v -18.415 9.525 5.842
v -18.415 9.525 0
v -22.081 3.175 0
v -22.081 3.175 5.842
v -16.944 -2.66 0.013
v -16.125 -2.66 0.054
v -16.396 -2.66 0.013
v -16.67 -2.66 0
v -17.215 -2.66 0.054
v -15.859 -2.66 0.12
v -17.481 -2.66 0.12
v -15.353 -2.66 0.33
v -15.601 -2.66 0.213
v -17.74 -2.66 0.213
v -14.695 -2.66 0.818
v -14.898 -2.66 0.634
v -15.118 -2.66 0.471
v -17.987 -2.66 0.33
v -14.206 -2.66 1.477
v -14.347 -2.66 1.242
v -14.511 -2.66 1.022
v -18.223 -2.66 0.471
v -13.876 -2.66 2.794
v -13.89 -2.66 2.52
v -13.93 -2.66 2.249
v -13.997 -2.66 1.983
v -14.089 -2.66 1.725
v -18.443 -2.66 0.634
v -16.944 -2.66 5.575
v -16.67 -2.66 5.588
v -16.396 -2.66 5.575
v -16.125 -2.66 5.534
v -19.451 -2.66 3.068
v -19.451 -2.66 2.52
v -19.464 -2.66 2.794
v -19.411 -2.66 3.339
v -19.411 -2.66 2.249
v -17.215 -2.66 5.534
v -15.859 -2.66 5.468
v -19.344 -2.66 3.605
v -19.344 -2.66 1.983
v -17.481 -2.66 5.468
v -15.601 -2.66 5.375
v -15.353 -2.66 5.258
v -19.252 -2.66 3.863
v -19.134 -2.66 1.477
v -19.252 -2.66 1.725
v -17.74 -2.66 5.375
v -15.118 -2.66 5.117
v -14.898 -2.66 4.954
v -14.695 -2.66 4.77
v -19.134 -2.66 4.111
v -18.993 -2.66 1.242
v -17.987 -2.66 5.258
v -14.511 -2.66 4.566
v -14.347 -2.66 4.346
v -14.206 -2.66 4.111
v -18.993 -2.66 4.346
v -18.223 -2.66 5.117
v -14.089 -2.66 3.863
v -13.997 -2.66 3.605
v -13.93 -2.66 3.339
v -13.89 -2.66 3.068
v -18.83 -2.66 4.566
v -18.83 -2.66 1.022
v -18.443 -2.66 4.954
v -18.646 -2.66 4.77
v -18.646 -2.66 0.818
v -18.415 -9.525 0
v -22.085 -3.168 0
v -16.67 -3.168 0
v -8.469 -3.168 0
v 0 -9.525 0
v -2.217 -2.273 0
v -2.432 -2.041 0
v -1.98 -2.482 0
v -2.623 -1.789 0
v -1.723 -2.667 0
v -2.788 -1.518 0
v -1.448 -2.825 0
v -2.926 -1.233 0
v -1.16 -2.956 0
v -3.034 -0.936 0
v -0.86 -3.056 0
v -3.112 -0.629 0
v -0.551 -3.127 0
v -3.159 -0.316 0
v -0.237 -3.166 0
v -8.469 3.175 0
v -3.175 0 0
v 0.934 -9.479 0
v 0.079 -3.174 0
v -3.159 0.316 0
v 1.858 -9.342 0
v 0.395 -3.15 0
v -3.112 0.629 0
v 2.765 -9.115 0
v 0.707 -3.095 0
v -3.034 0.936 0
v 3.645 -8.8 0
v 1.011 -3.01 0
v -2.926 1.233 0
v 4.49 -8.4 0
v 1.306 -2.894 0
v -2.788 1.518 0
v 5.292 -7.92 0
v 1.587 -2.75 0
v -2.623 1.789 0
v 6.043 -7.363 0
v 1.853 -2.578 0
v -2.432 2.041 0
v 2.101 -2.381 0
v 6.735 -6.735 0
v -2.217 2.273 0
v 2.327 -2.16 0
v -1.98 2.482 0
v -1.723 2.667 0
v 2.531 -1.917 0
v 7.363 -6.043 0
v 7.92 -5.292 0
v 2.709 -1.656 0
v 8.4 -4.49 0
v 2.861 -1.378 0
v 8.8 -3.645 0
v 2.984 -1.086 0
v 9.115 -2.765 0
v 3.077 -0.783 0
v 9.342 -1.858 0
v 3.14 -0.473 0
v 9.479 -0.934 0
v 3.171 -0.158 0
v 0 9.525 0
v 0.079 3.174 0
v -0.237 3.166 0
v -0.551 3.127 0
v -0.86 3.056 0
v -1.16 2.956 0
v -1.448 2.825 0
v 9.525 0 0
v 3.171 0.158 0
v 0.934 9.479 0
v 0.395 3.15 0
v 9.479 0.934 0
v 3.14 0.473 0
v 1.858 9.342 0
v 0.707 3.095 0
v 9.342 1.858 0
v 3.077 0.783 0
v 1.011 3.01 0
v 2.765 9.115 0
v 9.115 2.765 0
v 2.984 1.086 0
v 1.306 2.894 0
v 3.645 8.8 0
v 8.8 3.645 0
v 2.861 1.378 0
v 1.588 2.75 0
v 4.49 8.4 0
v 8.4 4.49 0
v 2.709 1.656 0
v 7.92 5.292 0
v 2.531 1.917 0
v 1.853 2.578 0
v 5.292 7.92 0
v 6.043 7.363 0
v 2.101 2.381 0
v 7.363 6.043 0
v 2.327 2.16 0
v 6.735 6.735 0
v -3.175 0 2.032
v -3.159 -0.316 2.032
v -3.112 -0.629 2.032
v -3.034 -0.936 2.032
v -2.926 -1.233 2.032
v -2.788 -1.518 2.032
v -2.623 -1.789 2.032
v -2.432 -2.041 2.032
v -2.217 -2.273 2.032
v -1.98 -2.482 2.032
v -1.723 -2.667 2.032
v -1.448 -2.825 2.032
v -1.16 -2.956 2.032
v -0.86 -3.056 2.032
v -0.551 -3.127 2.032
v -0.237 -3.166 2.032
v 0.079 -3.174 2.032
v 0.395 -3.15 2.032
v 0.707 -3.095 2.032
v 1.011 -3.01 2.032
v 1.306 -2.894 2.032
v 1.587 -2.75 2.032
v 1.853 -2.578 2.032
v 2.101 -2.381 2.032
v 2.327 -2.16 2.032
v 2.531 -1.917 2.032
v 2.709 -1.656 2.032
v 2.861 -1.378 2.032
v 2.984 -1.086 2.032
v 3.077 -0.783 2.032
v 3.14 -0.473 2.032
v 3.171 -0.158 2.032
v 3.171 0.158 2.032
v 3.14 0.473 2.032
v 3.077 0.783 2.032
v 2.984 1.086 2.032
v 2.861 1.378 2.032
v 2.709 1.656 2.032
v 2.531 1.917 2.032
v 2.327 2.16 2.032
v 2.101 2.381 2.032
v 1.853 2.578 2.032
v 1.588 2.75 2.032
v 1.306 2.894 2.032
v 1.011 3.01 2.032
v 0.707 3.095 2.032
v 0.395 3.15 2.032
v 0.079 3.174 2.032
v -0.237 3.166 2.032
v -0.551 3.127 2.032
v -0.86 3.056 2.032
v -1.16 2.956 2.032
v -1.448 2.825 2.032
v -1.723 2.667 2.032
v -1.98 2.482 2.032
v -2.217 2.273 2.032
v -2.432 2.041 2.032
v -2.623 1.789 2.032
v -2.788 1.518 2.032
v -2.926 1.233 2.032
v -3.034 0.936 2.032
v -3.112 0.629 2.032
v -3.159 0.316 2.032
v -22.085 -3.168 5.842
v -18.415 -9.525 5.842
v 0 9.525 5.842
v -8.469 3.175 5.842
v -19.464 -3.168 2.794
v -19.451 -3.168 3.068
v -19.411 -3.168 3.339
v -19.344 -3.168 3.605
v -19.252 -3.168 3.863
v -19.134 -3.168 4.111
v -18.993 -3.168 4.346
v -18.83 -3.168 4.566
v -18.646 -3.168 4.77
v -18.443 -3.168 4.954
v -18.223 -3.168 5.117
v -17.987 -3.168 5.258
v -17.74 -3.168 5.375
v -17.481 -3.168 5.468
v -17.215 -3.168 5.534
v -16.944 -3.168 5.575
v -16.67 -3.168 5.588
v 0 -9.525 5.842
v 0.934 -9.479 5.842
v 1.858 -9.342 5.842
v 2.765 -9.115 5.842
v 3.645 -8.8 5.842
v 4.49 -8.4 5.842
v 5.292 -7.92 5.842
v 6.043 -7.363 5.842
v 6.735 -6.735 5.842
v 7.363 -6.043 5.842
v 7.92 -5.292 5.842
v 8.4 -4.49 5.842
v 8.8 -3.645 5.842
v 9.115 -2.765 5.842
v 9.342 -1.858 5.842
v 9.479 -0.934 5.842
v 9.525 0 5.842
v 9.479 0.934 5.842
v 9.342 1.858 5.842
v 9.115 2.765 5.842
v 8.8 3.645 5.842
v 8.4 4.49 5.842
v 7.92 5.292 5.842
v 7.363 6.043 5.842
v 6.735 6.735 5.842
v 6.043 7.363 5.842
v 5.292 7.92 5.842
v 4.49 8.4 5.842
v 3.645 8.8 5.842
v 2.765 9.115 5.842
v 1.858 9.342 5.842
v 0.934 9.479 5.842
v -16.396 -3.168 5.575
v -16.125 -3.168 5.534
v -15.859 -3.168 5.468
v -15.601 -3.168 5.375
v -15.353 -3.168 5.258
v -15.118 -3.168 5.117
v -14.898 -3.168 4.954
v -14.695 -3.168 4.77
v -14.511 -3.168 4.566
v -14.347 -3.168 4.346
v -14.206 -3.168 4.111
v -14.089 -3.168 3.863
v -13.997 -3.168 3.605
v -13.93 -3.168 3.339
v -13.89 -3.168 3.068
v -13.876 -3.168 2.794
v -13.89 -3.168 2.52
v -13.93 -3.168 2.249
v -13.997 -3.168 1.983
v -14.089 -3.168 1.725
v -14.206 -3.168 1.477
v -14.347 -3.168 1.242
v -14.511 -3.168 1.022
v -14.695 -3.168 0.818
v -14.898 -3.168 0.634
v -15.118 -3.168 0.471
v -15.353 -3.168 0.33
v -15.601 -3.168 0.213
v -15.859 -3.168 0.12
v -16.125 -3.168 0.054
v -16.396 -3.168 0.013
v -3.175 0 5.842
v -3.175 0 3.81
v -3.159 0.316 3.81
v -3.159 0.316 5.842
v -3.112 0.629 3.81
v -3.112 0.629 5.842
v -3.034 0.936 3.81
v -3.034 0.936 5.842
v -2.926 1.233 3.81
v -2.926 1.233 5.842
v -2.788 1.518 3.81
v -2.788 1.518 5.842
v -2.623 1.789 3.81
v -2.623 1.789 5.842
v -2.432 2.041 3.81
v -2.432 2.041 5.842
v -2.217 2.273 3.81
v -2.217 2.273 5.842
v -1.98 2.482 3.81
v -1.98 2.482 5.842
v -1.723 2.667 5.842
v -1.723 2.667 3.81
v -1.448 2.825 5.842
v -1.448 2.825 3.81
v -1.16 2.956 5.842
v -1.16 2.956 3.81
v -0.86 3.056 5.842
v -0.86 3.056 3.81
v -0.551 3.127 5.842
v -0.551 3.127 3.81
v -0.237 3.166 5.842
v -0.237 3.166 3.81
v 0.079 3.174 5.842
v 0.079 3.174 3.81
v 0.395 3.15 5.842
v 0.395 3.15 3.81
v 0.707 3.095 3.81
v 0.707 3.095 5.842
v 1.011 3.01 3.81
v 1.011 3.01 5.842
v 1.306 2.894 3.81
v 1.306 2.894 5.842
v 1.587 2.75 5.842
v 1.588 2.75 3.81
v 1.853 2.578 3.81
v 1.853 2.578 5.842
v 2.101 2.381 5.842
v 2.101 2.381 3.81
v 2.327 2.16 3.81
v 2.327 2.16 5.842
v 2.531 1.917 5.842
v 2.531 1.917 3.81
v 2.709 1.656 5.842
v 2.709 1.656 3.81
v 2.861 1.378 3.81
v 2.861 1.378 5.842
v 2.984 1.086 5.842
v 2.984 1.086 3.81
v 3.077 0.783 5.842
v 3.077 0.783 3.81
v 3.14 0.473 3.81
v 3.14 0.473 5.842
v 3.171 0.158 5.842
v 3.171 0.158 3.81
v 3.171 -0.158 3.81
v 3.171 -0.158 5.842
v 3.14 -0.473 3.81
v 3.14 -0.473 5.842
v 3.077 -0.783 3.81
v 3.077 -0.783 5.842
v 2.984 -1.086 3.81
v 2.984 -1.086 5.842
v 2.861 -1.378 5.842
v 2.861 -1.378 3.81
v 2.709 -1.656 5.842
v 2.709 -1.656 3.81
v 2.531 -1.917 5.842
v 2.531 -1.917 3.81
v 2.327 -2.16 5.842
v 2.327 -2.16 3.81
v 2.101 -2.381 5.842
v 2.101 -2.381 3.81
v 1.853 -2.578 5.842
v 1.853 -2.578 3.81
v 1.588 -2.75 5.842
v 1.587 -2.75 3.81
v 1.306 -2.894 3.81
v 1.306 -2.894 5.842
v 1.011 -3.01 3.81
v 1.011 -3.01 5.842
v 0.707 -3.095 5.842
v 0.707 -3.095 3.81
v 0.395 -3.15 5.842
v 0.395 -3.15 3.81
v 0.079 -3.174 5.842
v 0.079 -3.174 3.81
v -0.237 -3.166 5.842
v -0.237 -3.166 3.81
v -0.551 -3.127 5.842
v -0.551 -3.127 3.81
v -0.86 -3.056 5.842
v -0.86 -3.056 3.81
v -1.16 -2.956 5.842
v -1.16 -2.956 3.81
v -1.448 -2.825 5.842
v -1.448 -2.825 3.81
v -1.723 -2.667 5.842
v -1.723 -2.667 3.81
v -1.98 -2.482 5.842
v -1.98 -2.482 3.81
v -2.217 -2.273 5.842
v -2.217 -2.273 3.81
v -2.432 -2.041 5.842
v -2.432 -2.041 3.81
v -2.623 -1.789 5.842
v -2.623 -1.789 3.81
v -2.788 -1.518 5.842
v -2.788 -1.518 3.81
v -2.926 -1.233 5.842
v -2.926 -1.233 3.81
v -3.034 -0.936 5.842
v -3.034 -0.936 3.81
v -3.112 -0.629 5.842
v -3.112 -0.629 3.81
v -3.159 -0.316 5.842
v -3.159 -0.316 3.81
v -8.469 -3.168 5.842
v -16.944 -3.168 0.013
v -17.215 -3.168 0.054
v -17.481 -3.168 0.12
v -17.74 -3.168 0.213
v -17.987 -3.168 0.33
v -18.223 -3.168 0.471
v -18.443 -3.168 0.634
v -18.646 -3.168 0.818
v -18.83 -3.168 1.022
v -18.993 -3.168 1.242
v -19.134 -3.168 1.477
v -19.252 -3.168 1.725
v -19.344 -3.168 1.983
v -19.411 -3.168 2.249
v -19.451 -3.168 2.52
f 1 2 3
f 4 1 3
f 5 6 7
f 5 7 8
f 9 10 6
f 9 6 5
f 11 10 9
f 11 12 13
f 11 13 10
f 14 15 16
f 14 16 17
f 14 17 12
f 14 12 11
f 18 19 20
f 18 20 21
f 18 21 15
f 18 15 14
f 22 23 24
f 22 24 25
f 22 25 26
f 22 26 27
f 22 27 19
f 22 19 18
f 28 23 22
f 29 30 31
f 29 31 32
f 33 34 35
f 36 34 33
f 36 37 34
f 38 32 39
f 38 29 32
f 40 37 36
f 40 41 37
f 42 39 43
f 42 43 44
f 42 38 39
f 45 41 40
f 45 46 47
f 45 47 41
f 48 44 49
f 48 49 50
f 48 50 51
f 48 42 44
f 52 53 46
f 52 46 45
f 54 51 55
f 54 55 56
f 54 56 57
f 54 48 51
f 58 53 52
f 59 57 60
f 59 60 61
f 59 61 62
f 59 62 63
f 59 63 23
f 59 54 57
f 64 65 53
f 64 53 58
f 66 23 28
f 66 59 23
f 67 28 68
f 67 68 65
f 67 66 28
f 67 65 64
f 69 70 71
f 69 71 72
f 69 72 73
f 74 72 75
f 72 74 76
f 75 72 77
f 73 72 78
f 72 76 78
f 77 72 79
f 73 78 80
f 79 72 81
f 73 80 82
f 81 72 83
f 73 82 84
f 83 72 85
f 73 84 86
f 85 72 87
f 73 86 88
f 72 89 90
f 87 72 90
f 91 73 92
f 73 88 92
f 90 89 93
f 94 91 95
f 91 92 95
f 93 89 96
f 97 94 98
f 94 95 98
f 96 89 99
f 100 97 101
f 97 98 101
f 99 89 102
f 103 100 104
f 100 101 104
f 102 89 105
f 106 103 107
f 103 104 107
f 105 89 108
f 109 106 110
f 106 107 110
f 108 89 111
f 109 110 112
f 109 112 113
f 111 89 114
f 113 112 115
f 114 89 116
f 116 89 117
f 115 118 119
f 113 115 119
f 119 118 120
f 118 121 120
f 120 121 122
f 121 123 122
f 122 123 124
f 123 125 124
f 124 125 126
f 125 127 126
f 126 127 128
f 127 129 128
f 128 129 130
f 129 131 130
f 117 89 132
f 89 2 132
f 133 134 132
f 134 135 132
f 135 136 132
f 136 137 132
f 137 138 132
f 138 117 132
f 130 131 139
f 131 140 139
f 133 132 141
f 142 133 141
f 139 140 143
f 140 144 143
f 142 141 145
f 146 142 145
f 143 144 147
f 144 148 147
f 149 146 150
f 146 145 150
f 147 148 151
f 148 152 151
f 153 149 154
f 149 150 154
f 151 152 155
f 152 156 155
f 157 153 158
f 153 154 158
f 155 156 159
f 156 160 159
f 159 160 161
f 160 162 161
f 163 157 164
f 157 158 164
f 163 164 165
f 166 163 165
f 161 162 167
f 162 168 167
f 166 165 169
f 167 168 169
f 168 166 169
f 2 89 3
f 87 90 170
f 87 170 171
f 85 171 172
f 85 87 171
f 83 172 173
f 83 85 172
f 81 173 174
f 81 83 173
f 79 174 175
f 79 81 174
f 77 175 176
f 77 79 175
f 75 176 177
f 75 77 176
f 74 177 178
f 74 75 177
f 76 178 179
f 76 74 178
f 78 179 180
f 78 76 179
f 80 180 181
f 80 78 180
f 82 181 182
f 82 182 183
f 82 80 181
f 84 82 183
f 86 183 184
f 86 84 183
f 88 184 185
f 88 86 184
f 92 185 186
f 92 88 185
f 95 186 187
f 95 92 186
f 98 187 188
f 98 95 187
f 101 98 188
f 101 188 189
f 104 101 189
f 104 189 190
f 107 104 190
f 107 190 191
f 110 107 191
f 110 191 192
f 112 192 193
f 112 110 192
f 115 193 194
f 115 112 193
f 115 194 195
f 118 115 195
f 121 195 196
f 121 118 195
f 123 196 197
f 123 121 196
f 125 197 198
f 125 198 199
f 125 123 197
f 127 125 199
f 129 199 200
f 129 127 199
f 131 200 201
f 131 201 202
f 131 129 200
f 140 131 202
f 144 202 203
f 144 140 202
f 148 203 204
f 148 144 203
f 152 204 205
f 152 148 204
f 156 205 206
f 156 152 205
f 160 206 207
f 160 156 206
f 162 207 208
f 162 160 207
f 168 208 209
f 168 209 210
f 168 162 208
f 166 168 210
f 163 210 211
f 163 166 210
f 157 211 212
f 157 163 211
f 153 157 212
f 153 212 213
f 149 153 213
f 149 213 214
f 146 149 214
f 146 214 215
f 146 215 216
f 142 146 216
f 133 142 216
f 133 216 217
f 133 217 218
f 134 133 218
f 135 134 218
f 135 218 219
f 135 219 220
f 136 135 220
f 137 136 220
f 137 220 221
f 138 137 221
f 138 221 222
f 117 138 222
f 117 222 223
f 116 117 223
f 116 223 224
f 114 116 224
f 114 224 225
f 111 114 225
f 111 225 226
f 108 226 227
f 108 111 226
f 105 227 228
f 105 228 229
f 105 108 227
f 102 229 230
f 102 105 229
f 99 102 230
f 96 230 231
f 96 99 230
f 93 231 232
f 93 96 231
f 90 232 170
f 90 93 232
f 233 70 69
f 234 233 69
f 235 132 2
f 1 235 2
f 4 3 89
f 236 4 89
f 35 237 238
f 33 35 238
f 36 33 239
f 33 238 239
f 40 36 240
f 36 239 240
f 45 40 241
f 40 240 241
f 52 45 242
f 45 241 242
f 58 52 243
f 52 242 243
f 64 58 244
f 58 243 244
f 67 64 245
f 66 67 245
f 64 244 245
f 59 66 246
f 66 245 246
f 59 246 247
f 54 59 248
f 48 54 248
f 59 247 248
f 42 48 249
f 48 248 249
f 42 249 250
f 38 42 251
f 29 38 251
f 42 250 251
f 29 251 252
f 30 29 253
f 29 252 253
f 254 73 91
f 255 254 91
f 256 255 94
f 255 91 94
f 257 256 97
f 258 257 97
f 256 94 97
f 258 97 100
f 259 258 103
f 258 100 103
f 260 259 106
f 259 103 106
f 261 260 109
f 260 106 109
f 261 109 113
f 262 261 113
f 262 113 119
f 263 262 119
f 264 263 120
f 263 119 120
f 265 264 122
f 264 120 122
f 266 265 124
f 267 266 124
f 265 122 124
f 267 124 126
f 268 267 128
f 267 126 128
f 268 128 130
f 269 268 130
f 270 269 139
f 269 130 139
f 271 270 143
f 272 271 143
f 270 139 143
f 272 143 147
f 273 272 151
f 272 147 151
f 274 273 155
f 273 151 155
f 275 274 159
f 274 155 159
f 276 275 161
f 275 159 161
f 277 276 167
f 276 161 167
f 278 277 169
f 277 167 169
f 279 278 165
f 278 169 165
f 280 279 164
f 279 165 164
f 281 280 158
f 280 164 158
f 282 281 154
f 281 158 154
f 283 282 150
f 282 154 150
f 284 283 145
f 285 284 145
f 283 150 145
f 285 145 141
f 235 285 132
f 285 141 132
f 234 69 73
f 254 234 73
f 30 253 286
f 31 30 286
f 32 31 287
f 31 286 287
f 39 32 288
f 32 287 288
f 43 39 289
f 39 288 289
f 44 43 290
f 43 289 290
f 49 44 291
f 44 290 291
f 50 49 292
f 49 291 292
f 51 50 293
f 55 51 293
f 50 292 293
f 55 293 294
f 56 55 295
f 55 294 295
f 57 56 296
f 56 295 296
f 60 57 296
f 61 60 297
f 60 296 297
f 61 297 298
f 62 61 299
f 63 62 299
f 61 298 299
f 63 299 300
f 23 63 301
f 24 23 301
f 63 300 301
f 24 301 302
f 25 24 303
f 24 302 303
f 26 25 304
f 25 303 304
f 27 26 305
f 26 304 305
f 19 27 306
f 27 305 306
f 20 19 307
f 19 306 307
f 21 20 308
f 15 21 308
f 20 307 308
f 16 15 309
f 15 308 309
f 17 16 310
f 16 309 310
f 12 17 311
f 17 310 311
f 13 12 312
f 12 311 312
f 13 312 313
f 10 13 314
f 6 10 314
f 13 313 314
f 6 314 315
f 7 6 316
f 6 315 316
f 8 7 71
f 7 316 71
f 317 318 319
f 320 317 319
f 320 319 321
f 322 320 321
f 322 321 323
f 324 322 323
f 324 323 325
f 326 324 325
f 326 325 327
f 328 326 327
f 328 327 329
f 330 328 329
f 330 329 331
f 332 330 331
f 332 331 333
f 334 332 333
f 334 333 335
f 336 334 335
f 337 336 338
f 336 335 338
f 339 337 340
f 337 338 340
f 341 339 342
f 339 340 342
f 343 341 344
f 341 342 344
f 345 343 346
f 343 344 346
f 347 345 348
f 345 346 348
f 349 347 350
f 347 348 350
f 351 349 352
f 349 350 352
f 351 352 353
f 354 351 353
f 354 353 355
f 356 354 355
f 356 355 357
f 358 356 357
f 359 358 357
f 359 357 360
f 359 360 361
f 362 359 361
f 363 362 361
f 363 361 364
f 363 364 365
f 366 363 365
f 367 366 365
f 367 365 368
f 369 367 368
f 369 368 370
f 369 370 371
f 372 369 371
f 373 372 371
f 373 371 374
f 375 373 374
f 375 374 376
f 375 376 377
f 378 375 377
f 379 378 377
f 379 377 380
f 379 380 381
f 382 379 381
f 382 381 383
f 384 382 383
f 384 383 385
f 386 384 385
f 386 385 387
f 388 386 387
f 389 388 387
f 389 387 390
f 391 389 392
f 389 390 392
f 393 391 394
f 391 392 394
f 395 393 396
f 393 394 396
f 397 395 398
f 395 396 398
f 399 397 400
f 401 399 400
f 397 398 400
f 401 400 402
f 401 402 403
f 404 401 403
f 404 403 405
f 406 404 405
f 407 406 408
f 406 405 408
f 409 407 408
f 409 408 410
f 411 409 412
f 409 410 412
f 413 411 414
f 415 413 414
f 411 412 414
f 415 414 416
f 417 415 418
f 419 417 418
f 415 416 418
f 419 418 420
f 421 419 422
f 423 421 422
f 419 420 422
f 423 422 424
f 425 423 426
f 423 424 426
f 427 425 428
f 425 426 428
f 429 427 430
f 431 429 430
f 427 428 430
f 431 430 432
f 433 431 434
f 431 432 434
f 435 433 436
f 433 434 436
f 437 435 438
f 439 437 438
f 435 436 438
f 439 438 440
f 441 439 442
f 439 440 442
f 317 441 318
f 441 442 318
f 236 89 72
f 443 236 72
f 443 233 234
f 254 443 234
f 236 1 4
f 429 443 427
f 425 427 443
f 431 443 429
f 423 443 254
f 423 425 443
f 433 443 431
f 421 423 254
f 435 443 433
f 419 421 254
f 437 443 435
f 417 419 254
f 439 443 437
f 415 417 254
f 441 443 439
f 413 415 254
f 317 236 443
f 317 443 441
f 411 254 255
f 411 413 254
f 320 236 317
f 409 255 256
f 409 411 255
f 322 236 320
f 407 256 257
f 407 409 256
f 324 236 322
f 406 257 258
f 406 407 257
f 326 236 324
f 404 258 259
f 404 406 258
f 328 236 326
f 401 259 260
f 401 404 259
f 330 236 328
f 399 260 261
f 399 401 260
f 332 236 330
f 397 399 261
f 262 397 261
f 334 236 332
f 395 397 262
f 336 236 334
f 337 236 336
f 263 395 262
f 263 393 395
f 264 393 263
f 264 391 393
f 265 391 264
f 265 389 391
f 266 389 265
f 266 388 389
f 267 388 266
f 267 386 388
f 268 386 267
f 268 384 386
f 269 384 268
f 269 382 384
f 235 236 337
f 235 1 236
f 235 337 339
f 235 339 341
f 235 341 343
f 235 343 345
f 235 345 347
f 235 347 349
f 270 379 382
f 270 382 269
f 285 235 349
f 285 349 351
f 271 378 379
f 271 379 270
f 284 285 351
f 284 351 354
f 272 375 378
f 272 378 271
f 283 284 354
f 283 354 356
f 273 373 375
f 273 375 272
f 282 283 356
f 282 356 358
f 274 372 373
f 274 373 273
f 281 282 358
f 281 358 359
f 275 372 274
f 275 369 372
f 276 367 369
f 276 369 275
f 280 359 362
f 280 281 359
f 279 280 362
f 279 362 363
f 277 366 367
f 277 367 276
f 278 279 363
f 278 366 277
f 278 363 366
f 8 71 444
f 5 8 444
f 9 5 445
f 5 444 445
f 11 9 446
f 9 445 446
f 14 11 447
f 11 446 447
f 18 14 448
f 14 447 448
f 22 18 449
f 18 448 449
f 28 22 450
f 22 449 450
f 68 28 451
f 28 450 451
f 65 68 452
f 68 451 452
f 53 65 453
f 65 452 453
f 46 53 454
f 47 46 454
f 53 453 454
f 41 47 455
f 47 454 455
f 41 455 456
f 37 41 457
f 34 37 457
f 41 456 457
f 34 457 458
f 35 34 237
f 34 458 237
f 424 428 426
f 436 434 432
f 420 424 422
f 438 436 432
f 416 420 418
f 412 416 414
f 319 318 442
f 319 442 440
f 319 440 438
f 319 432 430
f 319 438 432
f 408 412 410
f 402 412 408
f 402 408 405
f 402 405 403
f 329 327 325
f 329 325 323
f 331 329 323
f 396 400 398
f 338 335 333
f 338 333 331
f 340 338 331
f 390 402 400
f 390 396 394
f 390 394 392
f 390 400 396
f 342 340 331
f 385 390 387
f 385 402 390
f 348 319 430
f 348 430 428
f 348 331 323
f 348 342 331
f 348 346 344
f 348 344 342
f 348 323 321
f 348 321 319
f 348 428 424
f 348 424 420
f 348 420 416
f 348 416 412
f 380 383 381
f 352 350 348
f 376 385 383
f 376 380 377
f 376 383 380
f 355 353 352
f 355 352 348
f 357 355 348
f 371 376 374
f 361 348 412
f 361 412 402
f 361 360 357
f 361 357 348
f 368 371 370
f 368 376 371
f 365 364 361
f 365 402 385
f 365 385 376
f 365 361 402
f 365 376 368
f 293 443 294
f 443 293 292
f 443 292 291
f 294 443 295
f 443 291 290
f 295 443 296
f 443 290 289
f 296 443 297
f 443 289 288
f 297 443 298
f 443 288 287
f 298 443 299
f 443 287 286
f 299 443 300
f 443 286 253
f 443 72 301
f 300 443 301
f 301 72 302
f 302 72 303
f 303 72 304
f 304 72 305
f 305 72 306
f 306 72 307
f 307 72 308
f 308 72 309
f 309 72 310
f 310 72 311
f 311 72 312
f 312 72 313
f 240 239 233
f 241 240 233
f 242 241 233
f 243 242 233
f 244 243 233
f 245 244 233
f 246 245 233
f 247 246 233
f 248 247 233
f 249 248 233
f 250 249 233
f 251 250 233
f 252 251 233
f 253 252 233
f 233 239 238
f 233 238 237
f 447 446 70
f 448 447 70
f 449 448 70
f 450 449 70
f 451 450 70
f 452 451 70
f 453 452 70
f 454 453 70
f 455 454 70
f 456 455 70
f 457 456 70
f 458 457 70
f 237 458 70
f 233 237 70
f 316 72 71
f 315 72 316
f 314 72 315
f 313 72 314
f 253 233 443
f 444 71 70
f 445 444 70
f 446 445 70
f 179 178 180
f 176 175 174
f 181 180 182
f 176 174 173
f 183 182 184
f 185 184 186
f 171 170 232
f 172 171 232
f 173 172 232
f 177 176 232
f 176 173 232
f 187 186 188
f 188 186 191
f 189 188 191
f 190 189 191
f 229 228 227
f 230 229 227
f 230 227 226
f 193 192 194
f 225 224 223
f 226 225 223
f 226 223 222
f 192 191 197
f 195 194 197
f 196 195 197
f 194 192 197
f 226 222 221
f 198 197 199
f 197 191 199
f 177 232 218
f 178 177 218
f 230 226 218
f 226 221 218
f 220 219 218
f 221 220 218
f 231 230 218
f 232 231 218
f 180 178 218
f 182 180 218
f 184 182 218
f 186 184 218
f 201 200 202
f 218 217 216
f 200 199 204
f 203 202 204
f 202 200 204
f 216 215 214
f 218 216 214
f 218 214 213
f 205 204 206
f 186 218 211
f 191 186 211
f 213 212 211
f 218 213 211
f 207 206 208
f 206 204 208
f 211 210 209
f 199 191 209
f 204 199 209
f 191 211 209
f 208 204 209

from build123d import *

# Parameters (mm, degrees)
F1_DEPTH = 5.842
F2_DEPTH = 3.81
F3_DEPTH = 2.032
F5_DEPTH = 0.508


with BuildPart() as f1:
    # F0 (on Top) → F1 (new body)
    with BuildSketch(Plane.XY):
        with BuildLine():
            ThreePointArc((3.175, 0), (0, 3.175), (-3.175, 0))
            ThreePointArc((-3.175, 0), (0, -3.175), (3.175, 0))
        make_face()
        with BuildLine():
            Line((-8.469026, -3.167854), (-8.982779, -3.167854))
            ThreePointArc((-8.982779, -3.167854), (-5.502355, -7.774942), (0, -9.525))
            ThreePointArc((0, -9.525), (9.525, 0), (0, 9.525))
            ThreePointArc((0, 9.525), (-5.499261, 7.77713), (-8.980256, 3.175))
            Line((-8.980256, 3.175), (-8.469026, 3.175))
            Line((-8.469026, 3.175), (-8.469026, 0))
            Line((-8.469026, 0), (-8.469026, -3.167854))
        make_face()
        with BuildLine():
            ThreePointArc((3.175, 0), (0, -3.175), (-3.175, 0))
            ThreePointArc((-3.175, 0), (0, 3.175), (3.175, 0))
        make_face(mode=Mode.SUBTRACT)
        with BuildLine():
            ThreePointArc((0, -9.525), (-5.502355, -7.774942), (-8.982779, -3.167854))
            Line((-8.982779, -3.167854), (-22.0853, -3.167854))
            Line((-22.0853, -3.167854), (-18.415, -9.525))
            Line((-18.415, -9.525), (-12.065, -9.525))
            Line((-12.065, -9.525), (-9.525, -9.525))
            Line((-9.525, -9.525), (0, -9.525))
        make_face()
        with BuildLine():
            ThreePointArc((-8.980256, 3.175), (-5.499261, 7.77713), (0, 9.525))
            Line((0, 9.525), (-9.525, 9.525))
            Line((-9.525, 9.525), (-12.065, 9.525))
            Line((-12.065, 9.525), (-18.415, 9.525))
            Line((-18.415, 9.525), (-22.081174, 3.175))
            Line((-22.081174, 3.175), (-8.980256, 3.175))
        make_face()
    extrude(amount=F1_DEPTH)

    # F0 (on Top) → F2 (join)
    with BuildSketch(Plane.XY):
        with BuildLine():
            ThreePointArc((3.175, 0), (0, 3.175), (-3.175, 0))
            ThreePointArc((-3.175, 0), (0, -3.175), (3.175, 0))
        make_face()
    extrude(amount=F2_DEPTH)

    # F0 (on Top) → F3 (cut)
    with BuildSketch(Plane.XY):
        with BuildLine():
            ThreePointArc((3.175, 0), (0, 3.175), (-3.175, 0))
            ThreePointArc((-3.175, 0), (0, -3.175), (3.175, 0))
        make_face()
    extrude(amount=F3_DEPTH, mode=Mode.SUBTRACT)

    # F4 (on face) → F5 (join)
    with BuildSketch(Plane(origin=(0, -3.167854, 0), x_dir=(-1, 0, 0), z_dir=(0, 1, 0))):
        with BuildLine():
            ThreePointArc((16.670343, 5.588), (13.876343, 2.794), (16.670343, 0))
            Line((16.670343, 0), (16.670343, 5.588))
        make_face()
        with BuildLine():
            Line((16.670343, 5.588), (16.670343, 0))
            ThreePointArc((16.670343, 0), (18.645999, 0.818344), (19.464343, 2.794))
            ThreePointArc((19.464343, 2.794), (18.645999, 4.769656), (16.670343, 5.588))
        make_face()
    extrude(amount=F5_DEPTH)


solid = f1.part
